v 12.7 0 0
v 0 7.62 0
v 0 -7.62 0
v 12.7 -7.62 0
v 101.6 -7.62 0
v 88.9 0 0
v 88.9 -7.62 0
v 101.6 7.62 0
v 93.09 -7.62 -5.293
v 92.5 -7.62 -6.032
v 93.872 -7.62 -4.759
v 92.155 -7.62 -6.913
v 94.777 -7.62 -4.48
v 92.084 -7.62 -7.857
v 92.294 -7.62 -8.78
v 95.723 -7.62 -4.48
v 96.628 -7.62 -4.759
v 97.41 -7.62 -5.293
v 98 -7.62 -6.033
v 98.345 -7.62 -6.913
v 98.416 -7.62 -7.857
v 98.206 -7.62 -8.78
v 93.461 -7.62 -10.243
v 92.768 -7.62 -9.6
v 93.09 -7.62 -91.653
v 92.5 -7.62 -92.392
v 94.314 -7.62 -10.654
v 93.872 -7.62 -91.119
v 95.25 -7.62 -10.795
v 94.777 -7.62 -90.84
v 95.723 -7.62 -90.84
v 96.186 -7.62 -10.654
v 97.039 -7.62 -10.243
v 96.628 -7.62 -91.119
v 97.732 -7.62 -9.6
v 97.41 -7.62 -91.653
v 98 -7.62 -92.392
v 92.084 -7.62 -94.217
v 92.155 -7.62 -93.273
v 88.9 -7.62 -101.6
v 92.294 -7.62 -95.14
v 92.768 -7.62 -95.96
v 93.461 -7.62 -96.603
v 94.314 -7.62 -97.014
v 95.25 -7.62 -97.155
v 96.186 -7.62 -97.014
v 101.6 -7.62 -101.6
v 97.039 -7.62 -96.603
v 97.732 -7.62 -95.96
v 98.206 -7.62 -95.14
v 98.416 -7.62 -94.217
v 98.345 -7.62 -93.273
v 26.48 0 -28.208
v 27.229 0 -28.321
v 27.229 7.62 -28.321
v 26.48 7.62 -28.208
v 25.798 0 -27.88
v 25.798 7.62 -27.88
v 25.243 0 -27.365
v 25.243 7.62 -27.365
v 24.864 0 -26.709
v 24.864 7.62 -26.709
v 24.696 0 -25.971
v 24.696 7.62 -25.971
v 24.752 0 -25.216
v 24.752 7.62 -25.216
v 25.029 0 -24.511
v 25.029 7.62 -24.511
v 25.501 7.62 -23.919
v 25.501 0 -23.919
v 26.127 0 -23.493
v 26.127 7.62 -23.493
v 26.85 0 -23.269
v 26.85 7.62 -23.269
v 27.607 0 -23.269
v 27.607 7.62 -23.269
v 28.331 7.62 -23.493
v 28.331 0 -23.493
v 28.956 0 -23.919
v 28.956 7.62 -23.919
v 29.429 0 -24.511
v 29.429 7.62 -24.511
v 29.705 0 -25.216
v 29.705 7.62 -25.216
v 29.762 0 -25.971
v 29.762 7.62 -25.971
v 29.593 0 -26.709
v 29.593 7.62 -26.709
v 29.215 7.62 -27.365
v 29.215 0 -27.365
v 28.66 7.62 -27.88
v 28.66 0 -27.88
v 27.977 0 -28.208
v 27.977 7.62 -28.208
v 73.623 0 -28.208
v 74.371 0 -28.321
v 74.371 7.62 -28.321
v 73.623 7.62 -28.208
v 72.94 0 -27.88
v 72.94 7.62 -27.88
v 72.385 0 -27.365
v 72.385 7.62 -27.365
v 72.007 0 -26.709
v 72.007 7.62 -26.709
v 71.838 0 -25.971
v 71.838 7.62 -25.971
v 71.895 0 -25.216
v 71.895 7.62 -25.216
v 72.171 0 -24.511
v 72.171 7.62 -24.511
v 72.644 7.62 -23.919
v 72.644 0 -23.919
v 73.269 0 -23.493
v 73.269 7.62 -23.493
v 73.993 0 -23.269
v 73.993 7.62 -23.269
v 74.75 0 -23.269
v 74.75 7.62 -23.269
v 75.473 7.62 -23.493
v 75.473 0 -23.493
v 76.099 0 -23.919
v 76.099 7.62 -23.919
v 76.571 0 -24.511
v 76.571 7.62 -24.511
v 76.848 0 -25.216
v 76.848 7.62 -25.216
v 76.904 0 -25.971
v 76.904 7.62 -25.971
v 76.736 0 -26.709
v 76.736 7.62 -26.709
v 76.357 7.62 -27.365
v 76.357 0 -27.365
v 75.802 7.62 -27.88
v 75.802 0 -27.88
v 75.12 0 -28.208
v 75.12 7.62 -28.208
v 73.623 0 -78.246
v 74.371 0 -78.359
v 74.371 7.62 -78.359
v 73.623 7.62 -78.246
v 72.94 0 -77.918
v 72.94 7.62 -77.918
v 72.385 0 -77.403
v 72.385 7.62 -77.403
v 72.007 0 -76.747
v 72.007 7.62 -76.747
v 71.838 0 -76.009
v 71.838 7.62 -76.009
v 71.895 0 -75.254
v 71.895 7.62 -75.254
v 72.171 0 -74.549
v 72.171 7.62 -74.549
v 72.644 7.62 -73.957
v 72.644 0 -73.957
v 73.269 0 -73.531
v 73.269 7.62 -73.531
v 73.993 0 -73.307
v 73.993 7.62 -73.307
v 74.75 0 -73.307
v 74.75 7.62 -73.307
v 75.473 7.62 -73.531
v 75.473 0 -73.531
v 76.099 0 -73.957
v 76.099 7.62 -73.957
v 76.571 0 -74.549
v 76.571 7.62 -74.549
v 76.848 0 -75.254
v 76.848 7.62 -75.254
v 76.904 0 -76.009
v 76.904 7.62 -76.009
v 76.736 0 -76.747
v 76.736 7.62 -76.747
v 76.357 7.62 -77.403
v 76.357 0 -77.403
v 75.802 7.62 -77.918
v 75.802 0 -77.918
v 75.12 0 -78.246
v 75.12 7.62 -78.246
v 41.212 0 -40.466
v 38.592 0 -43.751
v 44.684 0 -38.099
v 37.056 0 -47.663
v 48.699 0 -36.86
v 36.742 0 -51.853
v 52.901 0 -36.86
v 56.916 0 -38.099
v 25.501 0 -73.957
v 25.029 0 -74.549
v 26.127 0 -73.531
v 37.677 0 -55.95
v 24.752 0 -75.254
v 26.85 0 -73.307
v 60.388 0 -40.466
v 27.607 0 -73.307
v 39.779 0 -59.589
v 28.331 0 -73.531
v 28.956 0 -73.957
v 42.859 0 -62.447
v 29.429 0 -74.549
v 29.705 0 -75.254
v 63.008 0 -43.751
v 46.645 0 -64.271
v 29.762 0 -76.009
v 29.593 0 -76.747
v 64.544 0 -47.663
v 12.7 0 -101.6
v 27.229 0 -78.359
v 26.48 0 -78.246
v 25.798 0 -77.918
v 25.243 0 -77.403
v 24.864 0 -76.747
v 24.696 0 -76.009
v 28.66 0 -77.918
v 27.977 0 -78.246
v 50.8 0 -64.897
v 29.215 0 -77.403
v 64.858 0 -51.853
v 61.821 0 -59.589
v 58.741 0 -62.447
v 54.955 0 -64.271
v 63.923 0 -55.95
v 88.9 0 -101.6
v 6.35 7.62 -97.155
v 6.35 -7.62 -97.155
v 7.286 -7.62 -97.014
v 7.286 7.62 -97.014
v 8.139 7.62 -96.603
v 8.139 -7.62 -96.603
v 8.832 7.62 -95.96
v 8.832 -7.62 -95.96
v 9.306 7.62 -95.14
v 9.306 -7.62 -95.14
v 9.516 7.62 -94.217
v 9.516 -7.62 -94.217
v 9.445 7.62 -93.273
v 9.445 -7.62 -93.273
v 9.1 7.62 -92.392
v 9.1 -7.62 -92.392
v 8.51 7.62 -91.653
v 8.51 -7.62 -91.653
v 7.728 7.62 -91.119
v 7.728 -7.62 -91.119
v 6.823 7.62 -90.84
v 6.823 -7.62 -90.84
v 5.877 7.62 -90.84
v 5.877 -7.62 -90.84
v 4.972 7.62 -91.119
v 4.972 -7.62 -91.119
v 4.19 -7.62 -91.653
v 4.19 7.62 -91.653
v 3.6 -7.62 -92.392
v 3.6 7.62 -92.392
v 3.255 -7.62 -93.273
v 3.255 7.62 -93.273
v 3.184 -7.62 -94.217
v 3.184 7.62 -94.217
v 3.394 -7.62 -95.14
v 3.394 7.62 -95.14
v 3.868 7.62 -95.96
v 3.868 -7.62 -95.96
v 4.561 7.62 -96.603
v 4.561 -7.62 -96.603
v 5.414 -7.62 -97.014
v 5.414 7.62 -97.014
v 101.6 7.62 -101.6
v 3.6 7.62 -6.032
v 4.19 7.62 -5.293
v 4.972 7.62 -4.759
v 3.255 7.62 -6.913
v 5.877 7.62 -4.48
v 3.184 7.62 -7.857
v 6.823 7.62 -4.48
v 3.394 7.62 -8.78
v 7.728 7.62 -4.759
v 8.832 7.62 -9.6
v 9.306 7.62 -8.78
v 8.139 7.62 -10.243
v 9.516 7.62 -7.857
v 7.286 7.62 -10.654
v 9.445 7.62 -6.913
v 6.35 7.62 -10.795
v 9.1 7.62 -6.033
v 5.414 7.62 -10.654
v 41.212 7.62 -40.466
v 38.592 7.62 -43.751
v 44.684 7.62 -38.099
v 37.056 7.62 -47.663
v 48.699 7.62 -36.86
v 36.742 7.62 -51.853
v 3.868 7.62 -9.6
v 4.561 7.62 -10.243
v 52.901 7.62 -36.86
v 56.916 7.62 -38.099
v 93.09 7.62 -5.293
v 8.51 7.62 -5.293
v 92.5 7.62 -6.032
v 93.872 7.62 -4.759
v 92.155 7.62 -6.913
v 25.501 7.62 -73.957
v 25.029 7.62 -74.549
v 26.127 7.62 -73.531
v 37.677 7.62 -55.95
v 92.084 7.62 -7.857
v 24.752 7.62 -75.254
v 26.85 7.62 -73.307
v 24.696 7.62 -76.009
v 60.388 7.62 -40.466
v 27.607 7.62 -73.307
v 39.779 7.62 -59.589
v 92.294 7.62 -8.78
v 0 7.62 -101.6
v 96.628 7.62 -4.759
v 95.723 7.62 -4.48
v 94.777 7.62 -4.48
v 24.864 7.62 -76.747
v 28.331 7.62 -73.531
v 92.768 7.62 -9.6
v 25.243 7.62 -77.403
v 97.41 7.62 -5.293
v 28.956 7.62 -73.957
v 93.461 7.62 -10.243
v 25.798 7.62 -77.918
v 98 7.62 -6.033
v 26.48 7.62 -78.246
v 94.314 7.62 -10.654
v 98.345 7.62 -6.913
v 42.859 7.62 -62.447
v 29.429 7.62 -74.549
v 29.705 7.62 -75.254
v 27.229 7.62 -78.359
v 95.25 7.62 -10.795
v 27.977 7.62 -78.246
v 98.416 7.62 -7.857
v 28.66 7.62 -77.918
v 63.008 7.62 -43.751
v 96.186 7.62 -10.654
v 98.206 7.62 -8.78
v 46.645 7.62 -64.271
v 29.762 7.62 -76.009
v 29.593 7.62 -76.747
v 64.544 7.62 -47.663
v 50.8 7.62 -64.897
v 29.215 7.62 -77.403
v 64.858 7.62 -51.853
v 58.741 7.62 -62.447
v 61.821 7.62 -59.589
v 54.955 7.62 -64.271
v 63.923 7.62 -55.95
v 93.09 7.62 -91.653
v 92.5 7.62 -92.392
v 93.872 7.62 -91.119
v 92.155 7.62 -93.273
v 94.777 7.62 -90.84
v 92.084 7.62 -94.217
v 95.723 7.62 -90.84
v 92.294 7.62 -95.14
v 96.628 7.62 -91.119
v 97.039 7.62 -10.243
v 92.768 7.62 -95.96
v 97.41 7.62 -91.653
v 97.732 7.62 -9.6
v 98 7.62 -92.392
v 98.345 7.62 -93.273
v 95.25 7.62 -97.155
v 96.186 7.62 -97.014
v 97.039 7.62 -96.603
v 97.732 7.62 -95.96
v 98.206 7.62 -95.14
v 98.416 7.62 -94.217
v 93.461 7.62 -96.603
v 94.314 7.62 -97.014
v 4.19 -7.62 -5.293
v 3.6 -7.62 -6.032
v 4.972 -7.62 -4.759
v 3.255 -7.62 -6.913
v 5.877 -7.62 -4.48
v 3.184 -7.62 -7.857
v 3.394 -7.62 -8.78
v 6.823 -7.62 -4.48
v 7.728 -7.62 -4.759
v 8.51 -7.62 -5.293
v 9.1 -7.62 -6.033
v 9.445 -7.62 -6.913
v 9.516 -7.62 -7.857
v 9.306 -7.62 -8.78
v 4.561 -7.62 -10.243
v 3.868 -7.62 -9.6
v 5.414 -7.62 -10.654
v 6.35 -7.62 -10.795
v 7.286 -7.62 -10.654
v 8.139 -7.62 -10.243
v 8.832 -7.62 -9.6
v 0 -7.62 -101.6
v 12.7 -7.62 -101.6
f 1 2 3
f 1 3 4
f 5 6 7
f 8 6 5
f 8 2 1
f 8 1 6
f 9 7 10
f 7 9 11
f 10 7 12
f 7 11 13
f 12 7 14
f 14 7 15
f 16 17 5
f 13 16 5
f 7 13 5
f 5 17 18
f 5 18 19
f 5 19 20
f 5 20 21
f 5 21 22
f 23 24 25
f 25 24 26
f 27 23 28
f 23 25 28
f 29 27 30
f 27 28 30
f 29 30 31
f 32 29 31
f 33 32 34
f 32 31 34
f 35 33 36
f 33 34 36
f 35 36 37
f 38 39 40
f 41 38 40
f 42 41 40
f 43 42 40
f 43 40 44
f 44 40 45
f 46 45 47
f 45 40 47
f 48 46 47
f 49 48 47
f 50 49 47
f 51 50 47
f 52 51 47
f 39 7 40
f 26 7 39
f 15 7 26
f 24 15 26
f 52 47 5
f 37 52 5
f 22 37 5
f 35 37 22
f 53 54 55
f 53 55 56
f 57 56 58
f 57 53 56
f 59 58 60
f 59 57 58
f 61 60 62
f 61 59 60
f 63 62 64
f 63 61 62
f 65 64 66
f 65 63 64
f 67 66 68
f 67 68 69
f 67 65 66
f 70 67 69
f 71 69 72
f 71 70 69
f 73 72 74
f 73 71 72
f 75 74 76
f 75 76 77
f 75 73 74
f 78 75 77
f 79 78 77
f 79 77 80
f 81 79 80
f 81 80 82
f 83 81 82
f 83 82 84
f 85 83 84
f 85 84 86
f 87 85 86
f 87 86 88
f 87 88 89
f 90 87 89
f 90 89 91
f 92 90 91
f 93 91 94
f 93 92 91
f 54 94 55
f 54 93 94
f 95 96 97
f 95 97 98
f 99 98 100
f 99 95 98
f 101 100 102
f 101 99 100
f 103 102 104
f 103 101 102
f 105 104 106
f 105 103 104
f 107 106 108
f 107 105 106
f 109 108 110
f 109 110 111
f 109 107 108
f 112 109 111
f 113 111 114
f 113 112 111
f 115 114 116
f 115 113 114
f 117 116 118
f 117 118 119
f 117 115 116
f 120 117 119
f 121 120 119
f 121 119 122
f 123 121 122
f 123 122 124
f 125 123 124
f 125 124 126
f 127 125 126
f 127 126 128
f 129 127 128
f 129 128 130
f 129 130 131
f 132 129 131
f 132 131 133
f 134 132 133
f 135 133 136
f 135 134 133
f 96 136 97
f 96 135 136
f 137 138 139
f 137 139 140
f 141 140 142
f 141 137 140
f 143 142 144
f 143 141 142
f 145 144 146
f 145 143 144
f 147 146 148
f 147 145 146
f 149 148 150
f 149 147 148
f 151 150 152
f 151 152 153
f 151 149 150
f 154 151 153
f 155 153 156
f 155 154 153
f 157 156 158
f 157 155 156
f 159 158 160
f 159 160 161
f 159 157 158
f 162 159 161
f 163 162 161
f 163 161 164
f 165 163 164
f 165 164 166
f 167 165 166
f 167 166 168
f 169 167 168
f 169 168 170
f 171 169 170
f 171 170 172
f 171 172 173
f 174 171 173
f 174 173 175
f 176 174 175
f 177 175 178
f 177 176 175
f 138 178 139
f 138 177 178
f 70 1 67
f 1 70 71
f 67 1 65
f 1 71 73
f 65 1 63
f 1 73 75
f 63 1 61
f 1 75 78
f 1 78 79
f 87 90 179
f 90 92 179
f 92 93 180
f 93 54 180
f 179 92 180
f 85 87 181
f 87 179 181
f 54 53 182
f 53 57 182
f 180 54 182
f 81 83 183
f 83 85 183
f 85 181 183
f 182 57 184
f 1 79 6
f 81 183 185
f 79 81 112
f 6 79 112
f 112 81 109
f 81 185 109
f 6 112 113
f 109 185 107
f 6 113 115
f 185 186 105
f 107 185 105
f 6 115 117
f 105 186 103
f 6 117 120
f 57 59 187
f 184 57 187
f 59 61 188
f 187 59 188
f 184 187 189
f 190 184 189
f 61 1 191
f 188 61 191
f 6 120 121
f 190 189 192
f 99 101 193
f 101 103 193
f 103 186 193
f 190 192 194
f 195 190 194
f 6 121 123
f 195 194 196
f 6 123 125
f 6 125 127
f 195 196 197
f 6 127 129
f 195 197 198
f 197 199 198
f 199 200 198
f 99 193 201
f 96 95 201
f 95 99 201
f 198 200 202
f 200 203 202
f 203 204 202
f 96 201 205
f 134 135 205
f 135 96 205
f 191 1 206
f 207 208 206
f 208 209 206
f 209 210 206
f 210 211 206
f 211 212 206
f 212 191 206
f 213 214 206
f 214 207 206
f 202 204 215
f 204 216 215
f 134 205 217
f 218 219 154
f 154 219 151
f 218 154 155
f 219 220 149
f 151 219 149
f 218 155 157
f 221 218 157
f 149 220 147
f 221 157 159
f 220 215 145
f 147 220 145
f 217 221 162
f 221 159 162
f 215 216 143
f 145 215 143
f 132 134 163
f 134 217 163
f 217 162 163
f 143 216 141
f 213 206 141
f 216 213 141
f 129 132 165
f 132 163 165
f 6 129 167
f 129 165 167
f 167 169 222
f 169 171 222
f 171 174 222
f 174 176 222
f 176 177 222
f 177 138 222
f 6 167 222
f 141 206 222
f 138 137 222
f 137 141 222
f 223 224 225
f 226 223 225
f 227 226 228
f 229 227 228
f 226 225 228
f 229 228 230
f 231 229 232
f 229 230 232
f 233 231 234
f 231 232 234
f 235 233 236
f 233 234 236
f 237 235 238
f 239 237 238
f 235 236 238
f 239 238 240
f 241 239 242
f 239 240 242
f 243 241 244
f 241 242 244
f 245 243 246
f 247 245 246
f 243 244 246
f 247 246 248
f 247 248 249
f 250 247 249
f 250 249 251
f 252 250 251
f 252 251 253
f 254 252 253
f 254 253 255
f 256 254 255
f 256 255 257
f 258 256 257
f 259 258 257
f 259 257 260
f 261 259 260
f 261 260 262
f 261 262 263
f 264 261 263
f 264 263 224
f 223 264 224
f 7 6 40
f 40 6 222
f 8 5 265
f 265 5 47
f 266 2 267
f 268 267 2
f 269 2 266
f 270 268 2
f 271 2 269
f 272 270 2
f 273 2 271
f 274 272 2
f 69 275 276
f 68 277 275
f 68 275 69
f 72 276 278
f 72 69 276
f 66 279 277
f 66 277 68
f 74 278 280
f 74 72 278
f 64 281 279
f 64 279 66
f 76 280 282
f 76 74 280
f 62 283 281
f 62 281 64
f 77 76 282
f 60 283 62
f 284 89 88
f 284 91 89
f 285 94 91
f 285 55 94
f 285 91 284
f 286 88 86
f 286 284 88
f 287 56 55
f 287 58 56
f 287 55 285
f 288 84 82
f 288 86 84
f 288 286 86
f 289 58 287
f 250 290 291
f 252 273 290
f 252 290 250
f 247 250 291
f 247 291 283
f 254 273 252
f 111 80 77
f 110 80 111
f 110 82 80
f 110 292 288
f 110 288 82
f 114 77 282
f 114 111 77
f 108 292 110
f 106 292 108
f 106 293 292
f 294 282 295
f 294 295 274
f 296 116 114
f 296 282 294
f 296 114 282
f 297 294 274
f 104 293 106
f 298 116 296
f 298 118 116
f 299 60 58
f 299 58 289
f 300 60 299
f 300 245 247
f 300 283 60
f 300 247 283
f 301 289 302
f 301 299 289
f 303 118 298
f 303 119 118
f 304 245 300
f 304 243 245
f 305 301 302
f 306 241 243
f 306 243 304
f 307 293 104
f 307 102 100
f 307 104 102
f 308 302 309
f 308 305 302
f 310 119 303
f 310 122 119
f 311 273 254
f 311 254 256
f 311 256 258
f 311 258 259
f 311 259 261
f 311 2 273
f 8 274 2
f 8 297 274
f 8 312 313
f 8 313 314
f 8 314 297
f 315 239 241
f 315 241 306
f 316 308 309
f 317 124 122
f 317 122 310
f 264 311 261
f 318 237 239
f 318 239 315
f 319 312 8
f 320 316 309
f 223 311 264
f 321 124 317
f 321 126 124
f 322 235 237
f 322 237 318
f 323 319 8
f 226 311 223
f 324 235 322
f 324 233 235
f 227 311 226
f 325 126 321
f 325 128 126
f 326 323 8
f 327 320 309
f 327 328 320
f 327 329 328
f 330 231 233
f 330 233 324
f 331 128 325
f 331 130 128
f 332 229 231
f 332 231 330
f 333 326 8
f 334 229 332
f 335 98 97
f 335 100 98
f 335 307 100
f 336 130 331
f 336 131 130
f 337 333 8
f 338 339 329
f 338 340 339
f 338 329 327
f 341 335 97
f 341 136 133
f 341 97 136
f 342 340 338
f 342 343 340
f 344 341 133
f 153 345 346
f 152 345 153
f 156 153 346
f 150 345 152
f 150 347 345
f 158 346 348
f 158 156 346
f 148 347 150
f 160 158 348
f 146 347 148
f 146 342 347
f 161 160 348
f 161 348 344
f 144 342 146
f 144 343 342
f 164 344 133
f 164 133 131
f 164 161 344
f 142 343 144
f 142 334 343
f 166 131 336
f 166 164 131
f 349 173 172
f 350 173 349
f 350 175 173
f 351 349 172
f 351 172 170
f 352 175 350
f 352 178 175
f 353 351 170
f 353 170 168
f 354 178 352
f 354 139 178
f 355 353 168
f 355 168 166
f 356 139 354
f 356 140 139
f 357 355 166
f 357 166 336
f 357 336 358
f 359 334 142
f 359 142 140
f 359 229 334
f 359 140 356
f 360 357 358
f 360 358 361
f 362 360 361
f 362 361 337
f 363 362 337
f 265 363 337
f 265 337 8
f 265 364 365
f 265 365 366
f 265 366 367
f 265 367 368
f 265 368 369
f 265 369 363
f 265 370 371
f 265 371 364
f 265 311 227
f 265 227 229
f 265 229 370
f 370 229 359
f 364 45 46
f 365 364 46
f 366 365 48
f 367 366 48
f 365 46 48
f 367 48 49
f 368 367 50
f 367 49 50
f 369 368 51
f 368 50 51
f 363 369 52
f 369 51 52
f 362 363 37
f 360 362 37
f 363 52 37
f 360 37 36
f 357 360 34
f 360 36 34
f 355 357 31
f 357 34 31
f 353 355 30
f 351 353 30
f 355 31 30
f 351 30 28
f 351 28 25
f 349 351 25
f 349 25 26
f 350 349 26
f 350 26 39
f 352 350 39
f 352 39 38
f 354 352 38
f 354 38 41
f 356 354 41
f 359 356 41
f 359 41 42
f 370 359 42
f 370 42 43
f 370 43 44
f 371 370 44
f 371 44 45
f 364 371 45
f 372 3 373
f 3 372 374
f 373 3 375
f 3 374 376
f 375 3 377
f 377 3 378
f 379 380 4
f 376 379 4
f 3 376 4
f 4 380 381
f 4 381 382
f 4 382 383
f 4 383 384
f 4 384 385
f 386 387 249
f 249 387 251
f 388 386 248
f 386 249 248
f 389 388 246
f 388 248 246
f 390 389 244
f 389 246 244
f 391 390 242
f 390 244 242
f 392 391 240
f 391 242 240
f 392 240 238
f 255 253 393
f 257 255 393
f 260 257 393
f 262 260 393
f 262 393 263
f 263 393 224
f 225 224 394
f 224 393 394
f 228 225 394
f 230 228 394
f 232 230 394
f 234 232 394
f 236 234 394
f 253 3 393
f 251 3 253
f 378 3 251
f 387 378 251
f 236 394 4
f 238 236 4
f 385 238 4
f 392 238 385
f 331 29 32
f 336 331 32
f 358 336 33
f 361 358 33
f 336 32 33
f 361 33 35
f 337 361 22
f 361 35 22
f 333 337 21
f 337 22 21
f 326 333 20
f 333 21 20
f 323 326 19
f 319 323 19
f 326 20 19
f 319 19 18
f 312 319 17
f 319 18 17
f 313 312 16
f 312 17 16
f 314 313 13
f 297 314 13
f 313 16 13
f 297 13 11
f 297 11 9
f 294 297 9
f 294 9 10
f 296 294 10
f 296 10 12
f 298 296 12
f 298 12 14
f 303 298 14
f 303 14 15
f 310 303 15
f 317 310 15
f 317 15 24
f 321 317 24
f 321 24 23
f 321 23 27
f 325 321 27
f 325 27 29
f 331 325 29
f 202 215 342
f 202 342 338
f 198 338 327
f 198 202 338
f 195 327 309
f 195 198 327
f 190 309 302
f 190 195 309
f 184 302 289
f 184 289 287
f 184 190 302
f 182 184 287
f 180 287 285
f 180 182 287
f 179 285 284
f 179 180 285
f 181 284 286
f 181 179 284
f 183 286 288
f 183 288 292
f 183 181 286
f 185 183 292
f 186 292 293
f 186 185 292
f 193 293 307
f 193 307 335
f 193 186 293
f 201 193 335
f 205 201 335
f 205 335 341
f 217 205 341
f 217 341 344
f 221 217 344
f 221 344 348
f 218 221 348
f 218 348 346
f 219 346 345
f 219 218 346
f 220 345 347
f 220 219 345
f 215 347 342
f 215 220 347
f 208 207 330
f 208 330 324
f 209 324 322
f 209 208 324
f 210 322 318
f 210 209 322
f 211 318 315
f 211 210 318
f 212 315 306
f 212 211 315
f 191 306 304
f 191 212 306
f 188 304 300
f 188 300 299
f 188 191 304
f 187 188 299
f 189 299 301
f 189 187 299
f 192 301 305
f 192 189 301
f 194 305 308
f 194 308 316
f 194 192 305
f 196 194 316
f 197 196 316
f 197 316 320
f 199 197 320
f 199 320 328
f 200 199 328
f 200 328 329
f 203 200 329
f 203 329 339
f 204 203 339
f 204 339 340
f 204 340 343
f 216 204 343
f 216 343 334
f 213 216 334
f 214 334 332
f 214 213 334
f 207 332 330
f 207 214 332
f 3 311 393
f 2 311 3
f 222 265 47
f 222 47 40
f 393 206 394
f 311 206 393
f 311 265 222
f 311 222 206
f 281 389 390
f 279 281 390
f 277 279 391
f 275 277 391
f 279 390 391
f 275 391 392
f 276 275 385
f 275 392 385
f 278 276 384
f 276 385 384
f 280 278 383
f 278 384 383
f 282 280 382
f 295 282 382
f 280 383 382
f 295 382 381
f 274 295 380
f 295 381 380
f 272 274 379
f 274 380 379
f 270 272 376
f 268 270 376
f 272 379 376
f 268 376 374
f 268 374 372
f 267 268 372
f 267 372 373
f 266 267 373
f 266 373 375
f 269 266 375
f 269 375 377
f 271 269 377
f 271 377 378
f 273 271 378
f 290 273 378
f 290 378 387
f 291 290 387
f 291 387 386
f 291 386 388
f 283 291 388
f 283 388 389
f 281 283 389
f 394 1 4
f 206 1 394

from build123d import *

# Parameters (mm, degrees)
SKETCH1_W           = 101.6
SKETCH1_H           = 101.6
SKETCH1_R           = 2.54
SKETCH1_R_2         = 14.097
BOSS_EXTRUDE1_DEPTH = 7.62
SKETCH1_3_W         = 12.7
SKETCH1_3_H         = 101.6
BOSS_EXTRUDE2_DEPTH = 7.62
SKETCH3_R           = 3.175
CUT_EXTRUDE1_DEPTH  = 25.4


with BuildPart() as part:
    # Sketch1 → Boss-Extrude1 (new body)
    with BuildSketch(Plane(origin=(0, 0, 0), x_dir=(1, 0, 0), z_dir=(0, 1, 0))):
        with Locations((50.8, 50.8)):
            Rectangle(SKETCH1_W, SKETCH1_H)
        with BuildLine():
            ThreePointArc((27.2288, 23.241), (25.794350063, 23.684824106), (24.86119419, 24.86119419))
            ThreePointArc((24.86119419, 24.86119419), (25.432748776, 27.577051224), (28.14860581, 28.14860581))
            ThreePointArc((28.14860581, 28.14860581), (29.725329467, 25.313089088), (27.2288, 23.241))
        make_face(mode=Mode.SUBTRACT)
        with Locations((74.3712, 25.781)):
            Circle(SKETCH1_R, mode=Mode.SUBTRACT)
        with Locations((50.8, 50.8)):
            Circle(SKETCH1_R_2, mode=Mode.SUBTRACT)
        with Locations((27.2288, 75.819)):
            Circle(SKETCH1_R, mode=Mode.SUBTRACT)
        with Locations((74.3712, 75.819)):
            Circle(SKETCH1_R, mode=Mode.SUBTRACT)
    extrude(amount=BOSS_EXTRUDE1_DEPTH)

    # Sketch1<3> → Boss-Extrude2 (add)
    with BuildSketch(Plane(origin=(0, 0, 0), x_dir=(1, 0, 0), z_dir=(0, 1, 0))):
        with Locations((6.35, 50.8)):
            Rectangle(SKETCH1_3_W, SKETCH1_3_H)
        with Locations((95.25, 50.8)):
            Rectangle(SKETCH1_3_W, SKETCH1_3_H)
    extrude(amount=-BOSS_EXTRUDE2_DEPTH)

    # Sketch3 → Cut-Extrude1 (cut)
    with BuildSketch(Plane.XZ.offset(7.62)):
        with Locations((6.35, -7.62)):
            Circle(SKETCH3_R)
        with Locations((95.25, -7.62)):
            Circle(SKETCH3_R)
        with Locations((6.35, -93.98)):
            Circle(SKETCH3_R)
        with Locations((95.25, -93.98)):
            Circle(SKETCH3_R)
    extrude(amount=-CUT_EXTRUDE1_DEPTH, mode=Mode.SUBTRACT)


solid = part.part
